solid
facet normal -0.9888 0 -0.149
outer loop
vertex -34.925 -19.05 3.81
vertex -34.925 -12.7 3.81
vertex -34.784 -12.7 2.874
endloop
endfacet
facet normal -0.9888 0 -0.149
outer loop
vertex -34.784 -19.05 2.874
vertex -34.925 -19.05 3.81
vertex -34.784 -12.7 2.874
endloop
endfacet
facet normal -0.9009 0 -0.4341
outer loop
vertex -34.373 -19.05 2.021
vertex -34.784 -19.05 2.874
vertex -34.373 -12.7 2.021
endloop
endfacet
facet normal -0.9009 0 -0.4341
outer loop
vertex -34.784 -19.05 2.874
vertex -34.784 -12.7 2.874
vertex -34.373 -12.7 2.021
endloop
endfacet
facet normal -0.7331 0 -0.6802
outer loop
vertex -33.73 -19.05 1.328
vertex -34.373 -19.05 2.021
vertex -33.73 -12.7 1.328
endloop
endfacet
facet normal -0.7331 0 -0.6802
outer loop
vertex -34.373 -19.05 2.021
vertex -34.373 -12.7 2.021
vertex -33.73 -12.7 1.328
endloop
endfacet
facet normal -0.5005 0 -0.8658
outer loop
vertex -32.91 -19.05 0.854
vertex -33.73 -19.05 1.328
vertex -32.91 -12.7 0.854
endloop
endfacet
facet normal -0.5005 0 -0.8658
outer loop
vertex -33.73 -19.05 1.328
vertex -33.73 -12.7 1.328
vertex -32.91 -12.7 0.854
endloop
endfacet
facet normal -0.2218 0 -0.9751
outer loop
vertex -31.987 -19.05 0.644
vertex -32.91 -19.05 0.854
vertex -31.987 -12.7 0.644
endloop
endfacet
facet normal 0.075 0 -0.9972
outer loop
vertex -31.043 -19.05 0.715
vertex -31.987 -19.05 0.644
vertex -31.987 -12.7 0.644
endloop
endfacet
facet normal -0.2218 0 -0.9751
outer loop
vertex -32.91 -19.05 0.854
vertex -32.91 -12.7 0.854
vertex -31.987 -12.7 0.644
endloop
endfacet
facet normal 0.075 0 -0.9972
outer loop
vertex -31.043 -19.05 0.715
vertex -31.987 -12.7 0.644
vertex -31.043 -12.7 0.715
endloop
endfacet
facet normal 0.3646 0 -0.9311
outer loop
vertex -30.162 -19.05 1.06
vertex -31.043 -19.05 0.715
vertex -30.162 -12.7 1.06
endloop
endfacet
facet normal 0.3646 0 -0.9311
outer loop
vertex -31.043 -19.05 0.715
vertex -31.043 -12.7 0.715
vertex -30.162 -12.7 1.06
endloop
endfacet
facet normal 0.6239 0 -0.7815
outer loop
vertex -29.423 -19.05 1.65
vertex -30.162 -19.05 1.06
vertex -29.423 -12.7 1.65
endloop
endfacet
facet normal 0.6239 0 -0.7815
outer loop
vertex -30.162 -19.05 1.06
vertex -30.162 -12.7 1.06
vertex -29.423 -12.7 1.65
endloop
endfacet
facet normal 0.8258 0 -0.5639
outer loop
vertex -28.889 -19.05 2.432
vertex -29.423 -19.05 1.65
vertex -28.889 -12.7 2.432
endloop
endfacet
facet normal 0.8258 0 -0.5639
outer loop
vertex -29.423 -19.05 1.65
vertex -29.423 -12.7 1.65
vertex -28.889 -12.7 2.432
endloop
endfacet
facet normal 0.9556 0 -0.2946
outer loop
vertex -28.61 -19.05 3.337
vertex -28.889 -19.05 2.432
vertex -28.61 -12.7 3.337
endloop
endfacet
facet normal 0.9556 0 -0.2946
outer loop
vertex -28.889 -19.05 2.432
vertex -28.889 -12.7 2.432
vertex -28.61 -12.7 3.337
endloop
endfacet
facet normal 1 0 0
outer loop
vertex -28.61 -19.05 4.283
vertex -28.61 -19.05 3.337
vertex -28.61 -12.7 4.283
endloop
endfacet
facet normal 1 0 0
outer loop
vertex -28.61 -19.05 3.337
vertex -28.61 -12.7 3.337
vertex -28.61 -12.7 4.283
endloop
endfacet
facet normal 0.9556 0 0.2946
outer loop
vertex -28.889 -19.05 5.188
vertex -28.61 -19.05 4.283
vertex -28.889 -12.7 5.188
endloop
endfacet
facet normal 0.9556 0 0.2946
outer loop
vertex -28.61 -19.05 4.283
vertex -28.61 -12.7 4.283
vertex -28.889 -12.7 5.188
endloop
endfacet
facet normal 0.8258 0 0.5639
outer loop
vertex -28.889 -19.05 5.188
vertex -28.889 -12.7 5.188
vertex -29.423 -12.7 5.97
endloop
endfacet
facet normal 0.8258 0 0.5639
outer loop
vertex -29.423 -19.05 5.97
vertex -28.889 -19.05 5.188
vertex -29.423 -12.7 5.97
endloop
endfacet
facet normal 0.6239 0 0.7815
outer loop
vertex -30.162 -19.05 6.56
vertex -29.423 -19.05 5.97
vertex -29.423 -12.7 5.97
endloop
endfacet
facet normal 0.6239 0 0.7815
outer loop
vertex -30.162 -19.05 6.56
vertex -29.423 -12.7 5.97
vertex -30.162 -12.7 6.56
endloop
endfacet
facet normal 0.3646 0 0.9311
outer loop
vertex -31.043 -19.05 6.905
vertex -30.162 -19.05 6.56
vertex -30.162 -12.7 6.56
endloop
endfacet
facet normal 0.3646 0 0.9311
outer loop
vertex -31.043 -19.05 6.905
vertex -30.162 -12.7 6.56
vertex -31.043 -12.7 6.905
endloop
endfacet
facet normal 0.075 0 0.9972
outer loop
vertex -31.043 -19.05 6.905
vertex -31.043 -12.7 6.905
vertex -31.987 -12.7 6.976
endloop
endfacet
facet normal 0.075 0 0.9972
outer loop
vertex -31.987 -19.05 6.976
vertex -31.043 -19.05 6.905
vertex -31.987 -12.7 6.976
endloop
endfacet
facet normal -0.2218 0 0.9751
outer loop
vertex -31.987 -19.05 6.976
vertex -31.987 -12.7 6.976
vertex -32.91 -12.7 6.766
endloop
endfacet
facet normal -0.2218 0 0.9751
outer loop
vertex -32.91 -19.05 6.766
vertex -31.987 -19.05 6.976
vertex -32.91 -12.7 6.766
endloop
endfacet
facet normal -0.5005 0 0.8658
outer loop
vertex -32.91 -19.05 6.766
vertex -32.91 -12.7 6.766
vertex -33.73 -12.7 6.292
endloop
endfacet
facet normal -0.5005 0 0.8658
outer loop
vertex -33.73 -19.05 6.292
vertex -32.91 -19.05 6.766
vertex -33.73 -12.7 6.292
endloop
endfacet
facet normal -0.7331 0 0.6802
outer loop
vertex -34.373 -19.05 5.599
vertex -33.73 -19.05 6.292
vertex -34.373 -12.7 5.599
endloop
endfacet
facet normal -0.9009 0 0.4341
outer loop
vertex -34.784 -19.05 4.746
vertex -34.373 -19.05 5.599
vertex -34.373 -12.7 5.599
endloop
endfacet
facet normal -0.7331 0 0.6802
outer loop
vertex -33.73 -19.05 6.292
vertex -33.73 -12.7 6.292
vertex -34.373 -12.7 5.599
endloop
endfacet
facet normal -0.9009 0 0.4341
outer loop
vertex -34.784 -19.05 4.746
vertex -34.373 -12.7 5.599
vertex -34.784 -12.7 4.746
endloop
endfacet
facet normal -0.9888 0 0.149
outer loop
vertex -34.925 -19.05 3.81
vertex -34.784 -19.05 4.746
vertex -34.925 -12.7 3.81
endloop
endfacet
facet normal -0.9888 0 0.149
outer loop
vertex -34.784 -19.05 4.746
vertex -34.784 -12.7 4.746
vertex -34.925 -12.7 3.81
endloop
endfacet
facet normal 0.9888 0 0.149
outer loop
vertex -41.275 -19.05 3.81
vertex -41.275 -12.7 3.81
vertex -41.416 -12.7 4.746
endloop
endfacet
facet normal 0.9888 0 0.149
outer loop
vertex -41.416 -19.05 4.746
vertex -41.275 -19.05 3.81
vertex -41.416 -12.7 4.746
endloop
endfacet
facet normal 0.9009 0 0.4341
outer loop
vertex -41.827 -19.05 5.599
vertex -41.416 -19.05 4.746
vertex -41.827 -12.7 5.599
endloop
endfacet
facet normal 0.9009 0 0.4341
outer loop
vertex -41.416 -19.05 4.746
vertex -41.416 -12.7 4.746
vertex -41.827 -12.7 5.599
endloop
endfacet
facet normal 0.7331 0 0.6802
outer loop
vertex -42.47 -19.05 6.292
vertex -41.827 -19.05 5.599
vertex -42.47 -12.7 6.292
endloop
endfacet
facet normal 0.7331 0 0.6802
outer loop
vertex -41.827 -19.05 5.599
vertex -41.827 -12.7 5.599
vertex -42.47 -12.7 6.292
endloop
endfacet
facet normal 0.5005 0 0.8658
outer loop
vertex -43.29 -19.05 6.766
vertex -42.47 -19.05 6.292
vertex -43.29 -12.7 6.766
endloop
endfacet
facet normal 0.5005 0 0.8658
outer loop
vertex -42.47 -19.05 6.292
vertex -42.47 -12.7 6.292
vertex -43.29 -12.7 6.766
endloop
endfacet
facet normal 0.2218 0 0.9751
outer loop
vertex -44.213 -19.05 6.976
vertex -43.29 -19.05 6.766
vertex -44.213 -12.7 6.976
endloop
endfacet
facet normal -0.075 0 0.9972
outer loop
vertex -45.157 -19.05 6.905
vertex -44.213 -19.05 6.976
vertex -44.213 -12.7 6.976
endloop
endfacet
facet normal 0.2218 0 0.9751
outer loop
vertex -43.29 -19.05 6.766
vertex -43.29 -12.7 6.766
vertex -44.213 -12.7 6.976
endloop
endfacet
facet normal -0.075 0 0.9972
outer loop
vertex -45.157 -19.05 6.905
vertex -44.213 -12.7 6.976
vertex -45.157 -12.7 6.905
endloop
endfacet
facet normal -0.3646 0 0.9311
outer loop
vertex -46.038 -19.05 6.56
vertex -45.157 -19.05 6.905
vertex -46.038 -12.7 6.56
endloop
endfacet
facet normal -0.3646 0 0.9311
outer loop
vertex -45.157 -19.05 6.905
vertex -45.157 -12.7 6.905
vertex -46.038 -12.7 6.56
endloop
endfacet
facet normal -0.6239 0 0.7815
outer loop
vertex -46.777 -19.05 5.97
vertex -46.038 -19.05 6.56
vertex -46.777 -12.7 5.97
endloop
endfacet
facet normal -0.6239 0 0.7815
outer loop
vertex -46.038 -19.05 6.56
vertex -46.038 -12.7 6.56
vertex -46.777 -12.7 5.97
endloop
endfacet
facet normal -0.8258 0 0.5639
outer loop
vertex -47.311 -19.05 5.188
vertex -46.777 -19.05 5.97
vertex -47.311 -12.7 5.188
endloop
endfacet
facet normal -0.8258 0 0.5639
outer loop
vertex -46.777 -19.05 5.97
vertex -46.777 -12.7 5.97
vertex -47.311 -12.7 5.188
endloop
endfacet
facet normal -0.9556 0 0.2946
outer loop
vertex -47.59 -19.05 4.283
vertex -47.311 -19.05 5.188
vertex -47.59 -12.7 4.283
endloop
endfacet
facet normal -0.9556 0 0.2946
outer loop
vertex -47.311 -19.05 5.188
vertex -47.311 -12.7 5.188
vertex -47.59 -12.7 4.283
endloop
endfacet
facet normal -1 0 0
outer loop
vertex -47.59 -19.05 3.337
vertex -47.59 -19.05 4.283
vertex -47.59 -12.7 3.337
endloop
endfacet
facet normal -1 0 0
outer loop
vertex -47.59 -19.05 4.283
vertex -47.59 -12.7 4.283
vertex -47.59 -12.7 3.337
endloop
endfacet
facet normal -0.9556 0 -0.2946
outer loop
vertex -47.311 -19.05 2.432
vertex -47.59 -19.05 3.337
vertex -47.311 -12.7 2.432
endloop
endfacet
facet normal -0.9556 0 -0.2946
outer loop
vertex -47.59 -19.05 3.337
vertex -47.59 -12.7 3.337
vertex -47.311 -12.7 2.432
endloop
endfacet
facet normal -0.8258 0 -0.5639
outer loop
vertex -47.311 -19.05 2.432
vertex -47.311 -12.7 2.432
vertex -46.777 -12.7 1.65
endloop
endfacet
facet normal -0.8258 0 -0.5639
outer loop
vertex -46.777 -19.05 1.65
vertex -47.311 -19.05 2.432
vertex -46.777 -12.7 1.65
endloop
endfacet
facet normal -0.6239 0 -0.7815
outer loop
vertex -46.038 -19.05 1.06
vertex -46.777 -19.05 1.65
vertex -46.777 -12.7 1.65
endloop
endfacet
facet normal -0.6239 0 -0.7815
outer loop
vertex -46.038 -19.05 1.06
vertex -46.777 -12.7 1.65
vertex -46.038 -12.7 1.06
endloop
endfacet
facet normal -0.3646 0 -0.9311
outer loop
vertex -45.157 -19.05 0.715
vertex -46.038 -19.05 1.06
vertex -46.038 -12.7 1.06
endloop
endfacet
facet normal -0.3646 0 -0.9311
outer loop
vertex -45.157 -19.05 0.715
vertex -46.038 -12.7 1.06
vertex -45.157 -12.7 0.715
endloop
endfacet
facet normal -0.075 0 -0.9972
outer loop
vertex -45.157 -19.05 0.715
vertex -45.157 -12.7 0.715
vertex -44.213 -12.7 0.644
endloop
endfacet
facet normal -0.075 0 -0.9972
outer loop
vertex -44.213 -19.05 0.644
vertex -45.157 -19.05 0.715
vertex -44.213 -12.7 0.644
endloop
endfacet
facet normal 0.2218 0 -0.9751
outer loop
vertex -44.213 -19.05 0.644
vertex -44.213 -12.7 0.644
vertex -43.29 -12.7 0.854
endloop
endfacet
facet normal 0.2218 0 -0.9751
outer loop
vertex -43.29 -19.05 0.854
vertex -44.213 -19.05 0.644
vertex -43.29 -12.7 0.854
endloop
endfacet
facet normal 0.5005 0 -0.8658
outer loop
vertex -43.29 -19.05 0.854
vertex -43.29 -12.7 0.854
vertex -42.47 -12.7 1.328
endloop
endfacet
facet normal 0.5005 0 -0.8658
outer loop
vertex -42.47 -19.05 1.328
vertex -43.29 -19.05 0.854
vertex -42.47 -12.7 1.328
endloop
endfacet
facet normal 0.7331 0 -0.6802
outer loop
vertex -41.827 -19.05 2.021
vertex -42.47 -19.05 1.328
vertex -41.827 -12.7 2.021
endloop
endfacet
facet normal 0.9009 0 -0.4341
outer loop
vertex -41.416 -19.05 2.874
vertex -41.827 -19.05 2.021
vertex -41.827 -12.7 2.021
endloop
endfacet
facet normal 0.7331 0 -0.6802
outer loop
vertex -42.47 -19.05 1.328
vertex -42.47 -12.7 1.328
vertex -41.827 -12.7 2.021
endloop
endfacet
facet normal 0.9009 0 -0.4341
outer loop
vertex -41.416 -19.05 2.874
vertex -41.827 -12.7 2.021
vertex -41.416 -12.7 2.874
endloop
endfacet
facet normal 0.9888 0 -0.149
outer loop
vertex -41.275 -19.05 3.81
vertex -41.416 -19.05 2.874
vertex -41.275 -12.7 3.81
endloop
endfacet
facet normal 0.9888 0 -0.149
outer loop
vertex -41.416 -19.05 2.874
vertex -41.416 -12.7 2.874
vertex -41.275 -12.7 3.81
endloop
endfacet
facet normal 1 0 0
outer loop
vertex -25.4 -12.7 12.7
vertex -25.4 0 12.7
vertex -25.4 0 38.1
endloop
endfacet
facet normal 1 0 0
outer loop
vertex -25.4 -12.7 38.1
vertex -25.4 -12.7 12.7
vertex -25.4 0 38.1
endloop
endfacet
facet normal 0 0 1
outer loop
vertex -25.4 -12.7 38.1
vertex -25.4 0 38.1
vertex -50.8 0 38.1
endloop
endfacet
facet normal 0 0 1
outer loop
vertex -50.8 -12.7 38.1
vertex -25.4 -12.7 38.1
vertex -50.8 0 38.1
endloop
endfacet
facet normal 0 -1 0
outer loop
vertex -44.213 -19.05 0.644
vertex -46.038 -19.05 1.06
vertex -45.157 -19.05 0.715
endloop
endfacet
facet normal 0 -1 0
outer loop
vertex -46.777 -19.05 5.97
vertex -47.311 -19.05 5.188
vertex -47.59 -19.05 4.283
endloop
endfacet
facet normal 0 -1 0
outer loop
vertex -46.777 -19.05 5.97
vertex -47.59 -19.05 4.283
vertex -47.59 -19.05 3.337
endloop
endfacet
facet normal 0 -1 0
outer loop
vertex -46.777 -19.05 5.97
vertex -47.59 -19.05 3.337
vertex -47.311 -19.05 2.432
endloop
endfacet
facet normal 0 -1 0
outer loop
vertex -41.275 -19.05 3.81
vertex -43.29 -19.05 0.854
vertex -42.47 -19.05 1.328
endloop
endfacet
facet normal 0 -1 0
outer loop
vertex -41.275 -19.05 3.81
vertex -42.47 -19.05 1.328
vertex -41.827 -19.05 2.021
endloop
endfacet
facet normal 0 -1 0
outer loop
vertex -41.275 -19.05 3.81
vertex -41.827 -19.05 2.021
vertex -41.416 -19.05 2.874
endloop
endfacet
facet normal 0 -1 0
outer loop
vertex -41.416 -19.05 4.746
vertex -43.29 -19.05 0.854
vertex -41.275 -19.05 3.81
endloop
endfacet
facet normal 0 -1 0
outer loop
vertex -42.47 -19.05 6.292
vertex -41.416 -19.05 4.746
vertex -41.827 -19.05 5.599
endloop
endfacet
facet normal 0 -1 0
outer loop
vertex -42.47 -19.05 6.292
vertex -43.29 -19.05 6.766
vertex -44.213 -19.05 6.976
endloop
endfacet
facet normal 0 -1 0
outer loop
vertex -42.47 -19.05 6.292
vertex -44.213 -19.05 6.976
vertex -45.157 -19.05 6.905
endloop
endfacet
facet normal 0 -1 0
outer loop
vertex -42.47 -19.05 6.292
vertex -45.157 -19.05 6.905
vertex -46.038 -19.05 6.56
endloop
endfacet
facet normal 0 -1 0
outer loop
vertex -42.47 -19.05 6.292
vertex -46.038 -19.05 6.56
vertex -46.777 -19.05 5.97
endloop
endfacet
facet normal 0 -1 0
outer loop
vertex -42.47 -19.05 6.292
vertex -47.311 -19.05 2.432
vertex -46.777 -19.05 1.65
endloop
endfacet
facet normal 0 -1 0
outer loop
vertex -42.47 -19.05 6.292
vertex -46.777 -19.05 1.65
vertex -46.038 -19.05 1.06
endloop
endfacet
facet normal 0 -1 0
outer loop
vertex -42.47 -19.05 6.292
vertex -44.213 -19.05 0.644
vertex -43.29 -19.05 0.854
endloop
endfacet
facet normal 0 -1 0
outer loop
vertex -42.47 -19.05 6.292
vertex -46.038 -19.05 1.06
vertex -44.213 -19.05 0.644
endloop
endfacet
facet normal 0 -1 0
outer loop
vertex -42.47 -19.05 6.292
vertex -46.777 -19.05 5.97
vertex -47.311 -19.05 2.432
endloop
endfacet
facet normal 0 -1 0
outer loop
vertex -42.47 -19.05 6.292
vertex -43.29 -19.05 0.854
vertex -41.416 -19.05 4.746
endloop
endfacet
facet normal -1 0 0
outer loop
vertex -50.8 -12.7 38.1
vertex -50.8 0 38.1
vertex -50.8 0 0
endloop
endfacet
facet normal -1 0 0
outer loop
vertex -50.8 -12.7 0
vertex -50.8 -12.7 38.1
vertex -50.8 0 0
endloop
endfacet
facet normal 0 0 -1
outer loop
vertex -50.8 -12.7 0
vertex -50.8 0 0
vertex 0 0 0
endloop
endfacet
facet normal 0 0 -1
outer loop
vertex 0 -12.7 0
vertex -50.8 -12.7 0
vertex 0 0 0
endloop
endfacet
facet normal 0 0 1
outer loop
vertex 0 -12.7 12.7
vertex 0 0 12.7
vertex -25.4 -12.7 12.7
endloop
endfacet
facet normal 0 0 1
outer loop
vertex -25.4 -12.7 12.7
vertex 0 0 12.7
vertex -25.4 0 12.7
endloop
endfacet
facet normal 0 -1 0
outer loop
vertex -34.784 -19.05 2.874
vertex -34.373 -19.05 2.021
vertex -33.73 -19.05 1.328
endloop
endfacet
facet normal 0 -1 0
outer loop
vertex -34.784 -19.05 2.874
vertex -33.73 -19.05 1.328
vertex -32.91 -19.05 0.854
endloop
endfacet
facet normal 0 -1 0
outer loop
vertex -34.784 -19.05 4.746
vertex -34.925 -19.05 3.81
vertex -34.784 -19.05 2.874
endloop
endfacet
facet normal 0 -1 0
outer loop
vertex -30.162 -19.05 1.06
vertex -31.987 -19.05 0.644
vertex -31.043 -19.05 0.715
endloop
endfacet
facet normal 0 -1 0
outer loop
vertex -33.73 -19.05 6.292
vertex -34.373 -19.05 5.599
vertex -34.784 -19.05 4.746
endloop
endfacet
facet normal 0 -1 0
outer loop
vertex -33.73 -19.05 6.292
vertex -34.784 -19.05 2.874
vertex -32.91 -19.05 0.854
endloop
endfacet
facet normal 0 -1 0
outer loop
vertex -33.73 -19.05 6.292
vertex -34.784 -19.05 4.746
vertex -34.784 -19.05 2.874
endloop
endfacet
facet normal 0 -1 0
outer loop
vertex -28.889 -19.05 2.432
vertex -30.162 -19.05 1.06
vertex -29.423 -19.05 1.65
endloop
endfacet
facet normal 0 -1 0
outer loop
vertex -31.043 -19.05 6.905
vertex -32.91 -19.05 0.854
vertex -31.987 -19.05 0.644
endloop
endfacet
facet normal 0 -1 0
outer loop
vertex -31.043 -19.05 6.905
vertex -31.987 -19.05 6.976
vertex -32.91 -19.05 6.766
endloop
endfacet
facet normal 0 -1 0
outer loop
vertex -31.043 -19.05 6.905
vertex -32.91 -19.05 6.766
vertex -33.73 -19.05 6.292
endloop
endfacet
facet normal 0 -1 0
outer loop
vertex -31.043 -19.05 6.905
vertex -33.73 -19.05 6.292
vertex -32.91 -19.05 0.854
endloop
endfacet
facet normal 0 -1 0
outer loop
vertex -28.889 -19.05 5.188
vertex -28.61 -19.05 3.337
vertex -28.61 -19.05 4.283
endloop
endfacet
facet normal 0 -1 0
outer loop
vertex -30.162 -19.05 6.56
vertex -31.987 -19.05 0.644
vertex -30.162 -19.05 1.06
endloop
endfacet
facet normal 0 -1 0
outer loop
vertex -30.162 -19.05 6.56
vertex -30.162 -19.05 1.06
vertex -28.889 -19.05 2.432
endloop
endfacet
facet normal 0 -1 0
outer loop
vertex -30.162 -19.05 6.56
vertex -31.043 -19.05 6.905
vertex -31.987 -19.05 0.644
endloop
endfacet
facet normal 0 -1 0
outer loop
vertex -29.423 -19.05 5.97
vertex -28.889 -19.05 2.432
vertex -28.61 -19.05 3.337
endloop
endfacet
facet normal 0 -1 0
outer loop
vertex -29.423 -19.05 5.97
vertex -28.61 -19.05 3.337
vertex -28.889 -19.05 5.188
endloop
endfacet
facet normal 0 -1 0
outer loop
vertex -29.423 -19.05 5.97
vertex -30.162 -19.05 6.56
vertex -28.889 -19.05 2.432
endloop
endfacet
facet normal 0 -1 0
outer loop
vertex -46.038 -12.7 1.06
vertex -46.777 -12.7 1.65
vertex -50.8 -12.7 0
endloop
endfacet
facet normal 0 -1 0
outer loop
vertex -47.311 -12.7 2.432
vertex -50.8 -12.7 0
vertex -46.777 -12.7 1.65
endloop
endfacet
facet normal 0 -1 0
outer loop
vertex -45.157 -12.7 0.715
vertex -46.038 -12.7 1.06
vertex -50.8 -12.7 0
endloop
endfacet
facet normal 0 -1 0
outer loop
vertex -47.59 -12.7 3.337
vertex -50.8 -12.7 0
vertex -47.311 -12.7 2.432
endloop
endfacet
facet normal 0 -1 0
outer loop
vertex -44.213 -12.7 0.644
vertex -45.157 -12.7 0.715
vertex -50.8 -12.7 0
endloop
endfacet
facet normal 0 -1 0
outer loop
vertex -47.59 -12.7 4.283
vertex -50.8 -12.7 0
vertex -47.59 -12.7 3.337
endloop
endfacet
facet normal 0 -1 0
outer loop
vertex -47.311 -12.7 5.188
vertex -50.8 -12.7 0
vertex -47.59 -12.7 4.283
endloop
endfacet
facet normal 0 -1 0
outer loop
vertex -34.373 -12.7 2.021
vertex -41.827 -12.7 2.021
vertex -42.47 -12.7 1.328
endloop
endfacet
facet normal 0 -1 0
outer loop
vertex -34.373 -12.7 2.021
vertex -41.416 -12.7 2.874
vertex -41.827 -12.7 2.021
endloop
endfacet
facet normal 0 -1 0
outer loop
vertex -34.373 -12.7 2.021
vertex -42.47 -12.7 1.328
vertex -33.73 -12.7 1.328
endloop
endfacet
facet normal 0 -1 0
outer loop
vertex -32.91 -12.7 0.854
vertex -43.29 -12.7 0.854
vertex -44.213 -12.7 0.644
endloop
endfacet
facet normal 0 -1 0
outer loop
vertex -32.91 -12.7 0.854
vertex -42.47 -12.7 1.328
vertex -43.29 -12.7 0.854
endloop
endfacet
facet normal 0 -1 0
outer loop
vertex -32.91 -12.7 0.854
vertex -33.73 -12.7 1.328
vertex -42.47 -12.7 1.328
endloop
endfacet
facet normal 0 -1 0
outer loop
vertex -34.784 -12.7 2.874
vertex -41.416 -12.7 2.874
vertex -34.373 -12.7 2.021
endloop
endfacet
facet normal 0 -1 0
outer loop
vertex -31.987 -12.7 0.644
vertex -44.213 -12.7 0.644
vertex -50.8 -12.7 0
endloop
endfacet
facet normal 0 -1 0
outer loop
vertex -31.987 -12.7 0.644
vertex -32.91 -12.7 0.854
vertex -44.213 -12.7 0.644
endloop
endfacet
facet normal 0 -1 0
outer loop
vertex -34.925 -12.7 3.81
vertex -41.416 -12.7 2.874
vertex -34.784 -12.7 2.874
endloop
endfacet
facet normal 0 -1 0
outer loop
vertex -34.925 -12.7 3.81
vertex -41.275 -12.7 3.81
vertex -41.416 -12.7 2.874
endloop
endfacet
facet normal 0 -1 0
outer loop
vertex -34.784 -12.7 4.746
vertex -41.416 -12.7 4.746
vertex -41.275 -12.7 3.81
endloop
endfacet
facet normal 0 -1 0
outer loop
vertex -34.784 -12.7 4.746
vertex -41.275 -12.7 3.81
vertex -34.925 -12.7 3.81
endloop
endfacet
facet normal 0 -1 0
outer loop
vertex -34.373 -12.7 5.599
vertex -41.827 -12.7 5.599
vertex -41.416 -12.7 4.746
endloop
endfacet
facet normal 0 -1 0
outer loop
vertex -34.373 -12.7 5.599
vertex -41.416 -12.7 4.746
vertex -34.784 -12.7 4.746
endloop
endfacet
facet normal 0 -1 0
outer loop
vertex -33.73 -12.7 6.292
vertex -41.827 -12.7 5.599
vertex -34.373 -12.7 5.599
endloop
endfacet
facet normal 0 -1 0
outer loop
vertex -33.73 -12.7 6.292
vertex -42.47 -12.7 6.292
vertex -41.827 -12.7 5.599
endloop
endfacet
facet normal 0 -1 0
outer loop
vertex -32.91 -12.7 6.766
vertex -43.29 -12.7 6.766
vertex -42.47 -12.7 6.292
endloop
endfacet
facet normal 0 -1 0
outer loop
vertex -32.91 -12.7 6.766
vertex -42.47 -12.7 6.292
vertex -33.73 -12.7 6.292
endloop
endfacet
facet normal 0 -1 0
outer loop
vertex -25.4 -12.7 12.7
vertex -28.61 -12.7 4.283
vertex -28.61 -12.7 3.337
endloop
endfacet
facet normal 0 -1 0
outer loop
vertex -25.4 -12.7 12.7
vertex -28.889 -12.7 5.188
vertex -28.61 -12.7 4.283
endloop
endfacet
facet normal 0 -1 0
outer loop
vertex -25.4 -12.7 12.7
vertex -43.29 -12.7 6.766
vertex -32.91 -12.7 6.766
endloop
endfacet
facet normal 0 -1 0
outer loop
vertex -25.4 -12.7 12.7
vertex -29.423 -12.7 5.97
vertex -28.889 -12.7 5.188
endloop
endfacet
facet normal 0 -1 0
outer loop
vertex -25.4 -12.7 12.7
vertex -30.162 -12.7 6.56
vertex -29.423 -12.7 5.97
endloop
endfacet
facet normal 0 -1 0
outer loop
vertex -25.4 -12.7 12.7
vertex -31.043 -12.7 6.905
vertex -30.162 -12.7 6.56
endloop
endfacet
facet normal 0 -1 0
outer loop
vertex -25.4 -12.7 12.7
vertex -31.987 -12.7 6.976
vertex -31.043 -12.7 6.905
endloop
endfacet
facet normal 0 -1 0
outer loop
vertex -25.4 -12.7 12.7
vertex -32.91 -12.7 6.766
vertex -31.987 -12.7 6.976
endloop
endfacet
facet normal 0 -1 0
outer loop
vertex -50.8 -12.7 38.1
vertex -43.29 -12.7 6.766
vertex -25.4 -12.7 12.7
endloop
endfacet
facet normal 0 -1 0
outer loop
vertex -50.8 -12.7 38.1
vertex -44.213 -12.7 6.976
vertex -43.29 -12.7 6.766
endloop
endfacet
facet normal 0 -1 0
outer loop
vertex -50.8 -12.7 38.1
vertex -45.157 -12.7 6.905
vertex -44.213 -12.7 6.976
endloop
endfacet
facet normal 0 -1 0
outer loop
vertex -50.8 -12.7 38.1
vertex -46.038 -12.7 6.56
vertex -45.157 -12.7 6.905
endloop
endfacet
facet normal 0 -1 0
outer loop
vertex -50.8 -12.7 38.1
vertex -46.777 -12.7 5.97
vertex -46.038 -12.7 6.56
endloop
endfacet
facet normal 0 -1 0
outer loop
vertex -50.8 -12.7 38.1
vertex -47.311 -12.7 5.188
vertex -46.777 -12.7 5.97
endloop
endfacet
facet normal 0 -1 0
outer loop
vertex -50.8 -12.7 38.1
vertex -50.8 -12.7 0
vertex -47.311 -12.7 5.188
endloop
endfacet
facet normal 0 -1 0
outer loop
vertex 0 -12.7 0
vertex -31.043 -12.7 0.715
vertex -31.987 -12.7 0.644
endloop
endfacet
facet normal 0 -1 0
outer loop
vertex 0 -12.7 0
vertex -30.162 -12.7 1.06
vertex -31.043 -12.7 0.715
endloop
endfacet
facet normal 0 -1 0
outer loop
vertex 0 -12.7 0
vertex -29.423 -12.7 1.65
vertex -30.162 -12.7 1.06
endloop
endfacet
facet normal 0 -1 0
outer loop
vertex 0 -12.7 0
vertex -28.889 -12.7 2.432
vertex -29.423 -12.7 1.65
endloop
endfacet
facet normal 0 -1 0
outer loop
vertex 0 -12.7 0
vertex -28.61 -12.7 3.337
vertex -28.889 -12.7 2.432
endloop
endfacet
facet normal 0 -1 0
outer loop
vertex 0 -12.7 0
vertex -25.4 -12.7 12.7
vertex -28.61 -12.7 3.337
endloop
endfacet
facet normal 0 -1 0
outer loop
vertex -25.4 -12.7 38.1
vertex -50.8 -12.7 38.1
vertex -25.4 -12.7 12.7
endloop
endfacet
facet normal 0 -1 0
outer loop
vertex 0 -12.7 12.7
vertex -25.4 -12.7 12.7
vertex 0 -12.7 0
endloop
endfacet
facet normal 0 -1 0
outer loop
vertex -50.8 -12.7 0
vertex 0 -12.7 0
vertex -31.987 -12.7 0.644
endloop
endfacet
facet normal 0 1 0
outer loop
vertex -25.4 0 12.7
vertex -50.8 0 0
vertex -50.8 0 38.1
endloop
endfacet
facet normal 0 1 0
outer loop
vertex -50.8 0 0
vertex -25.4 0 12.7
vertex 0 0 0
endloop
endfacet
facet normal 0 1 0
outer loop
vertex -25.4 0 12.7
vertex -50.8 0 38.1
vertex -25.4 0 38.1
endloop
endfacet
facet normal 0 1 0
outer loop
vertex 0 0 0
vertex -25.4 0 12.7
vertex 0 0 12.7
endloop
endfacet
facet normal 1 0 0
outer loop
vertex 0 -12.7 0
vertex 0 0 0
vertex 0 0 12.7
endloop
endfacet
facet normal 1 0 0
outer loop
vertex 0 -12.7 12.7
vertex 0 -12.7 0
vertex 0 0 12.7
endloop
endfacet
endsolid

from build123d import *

# Parameters (mm, degrees)
F1_DEPTH = 12.7
F2_R     = 3.175
F3_DEPTH = 6.35


with BuildPart() as f1:
    # F0 (on Front) → F1 (new body)
    with BuildSketch(Plane.XZ):
        Polygon((-50.8, 0), (0, 0), (0, 12.7), (-25.4, 12.7), (-25.4, 38.1), (-50.8, 38.1), align=None)
    extrude(amount=F1_DEPTH)

    # F2 (on face) → F3 (join)
    with BuildSketch(Plane.XZ.offset(12.7)):
        with Locations((-44.45, 3.81)):
            Circle(F2_R)
        with BuildLine():
            ThreePointArc((-28.575, 3.81), (-31.75, 6.985), (-34.925, 3.81))
            ThreePointArc((-34.925, 3.81), (-31.75, 0.635), (-28.575, 3.81))
        make_face()
    extrude(amount=F3_DEPTH)


solid = f1.part
